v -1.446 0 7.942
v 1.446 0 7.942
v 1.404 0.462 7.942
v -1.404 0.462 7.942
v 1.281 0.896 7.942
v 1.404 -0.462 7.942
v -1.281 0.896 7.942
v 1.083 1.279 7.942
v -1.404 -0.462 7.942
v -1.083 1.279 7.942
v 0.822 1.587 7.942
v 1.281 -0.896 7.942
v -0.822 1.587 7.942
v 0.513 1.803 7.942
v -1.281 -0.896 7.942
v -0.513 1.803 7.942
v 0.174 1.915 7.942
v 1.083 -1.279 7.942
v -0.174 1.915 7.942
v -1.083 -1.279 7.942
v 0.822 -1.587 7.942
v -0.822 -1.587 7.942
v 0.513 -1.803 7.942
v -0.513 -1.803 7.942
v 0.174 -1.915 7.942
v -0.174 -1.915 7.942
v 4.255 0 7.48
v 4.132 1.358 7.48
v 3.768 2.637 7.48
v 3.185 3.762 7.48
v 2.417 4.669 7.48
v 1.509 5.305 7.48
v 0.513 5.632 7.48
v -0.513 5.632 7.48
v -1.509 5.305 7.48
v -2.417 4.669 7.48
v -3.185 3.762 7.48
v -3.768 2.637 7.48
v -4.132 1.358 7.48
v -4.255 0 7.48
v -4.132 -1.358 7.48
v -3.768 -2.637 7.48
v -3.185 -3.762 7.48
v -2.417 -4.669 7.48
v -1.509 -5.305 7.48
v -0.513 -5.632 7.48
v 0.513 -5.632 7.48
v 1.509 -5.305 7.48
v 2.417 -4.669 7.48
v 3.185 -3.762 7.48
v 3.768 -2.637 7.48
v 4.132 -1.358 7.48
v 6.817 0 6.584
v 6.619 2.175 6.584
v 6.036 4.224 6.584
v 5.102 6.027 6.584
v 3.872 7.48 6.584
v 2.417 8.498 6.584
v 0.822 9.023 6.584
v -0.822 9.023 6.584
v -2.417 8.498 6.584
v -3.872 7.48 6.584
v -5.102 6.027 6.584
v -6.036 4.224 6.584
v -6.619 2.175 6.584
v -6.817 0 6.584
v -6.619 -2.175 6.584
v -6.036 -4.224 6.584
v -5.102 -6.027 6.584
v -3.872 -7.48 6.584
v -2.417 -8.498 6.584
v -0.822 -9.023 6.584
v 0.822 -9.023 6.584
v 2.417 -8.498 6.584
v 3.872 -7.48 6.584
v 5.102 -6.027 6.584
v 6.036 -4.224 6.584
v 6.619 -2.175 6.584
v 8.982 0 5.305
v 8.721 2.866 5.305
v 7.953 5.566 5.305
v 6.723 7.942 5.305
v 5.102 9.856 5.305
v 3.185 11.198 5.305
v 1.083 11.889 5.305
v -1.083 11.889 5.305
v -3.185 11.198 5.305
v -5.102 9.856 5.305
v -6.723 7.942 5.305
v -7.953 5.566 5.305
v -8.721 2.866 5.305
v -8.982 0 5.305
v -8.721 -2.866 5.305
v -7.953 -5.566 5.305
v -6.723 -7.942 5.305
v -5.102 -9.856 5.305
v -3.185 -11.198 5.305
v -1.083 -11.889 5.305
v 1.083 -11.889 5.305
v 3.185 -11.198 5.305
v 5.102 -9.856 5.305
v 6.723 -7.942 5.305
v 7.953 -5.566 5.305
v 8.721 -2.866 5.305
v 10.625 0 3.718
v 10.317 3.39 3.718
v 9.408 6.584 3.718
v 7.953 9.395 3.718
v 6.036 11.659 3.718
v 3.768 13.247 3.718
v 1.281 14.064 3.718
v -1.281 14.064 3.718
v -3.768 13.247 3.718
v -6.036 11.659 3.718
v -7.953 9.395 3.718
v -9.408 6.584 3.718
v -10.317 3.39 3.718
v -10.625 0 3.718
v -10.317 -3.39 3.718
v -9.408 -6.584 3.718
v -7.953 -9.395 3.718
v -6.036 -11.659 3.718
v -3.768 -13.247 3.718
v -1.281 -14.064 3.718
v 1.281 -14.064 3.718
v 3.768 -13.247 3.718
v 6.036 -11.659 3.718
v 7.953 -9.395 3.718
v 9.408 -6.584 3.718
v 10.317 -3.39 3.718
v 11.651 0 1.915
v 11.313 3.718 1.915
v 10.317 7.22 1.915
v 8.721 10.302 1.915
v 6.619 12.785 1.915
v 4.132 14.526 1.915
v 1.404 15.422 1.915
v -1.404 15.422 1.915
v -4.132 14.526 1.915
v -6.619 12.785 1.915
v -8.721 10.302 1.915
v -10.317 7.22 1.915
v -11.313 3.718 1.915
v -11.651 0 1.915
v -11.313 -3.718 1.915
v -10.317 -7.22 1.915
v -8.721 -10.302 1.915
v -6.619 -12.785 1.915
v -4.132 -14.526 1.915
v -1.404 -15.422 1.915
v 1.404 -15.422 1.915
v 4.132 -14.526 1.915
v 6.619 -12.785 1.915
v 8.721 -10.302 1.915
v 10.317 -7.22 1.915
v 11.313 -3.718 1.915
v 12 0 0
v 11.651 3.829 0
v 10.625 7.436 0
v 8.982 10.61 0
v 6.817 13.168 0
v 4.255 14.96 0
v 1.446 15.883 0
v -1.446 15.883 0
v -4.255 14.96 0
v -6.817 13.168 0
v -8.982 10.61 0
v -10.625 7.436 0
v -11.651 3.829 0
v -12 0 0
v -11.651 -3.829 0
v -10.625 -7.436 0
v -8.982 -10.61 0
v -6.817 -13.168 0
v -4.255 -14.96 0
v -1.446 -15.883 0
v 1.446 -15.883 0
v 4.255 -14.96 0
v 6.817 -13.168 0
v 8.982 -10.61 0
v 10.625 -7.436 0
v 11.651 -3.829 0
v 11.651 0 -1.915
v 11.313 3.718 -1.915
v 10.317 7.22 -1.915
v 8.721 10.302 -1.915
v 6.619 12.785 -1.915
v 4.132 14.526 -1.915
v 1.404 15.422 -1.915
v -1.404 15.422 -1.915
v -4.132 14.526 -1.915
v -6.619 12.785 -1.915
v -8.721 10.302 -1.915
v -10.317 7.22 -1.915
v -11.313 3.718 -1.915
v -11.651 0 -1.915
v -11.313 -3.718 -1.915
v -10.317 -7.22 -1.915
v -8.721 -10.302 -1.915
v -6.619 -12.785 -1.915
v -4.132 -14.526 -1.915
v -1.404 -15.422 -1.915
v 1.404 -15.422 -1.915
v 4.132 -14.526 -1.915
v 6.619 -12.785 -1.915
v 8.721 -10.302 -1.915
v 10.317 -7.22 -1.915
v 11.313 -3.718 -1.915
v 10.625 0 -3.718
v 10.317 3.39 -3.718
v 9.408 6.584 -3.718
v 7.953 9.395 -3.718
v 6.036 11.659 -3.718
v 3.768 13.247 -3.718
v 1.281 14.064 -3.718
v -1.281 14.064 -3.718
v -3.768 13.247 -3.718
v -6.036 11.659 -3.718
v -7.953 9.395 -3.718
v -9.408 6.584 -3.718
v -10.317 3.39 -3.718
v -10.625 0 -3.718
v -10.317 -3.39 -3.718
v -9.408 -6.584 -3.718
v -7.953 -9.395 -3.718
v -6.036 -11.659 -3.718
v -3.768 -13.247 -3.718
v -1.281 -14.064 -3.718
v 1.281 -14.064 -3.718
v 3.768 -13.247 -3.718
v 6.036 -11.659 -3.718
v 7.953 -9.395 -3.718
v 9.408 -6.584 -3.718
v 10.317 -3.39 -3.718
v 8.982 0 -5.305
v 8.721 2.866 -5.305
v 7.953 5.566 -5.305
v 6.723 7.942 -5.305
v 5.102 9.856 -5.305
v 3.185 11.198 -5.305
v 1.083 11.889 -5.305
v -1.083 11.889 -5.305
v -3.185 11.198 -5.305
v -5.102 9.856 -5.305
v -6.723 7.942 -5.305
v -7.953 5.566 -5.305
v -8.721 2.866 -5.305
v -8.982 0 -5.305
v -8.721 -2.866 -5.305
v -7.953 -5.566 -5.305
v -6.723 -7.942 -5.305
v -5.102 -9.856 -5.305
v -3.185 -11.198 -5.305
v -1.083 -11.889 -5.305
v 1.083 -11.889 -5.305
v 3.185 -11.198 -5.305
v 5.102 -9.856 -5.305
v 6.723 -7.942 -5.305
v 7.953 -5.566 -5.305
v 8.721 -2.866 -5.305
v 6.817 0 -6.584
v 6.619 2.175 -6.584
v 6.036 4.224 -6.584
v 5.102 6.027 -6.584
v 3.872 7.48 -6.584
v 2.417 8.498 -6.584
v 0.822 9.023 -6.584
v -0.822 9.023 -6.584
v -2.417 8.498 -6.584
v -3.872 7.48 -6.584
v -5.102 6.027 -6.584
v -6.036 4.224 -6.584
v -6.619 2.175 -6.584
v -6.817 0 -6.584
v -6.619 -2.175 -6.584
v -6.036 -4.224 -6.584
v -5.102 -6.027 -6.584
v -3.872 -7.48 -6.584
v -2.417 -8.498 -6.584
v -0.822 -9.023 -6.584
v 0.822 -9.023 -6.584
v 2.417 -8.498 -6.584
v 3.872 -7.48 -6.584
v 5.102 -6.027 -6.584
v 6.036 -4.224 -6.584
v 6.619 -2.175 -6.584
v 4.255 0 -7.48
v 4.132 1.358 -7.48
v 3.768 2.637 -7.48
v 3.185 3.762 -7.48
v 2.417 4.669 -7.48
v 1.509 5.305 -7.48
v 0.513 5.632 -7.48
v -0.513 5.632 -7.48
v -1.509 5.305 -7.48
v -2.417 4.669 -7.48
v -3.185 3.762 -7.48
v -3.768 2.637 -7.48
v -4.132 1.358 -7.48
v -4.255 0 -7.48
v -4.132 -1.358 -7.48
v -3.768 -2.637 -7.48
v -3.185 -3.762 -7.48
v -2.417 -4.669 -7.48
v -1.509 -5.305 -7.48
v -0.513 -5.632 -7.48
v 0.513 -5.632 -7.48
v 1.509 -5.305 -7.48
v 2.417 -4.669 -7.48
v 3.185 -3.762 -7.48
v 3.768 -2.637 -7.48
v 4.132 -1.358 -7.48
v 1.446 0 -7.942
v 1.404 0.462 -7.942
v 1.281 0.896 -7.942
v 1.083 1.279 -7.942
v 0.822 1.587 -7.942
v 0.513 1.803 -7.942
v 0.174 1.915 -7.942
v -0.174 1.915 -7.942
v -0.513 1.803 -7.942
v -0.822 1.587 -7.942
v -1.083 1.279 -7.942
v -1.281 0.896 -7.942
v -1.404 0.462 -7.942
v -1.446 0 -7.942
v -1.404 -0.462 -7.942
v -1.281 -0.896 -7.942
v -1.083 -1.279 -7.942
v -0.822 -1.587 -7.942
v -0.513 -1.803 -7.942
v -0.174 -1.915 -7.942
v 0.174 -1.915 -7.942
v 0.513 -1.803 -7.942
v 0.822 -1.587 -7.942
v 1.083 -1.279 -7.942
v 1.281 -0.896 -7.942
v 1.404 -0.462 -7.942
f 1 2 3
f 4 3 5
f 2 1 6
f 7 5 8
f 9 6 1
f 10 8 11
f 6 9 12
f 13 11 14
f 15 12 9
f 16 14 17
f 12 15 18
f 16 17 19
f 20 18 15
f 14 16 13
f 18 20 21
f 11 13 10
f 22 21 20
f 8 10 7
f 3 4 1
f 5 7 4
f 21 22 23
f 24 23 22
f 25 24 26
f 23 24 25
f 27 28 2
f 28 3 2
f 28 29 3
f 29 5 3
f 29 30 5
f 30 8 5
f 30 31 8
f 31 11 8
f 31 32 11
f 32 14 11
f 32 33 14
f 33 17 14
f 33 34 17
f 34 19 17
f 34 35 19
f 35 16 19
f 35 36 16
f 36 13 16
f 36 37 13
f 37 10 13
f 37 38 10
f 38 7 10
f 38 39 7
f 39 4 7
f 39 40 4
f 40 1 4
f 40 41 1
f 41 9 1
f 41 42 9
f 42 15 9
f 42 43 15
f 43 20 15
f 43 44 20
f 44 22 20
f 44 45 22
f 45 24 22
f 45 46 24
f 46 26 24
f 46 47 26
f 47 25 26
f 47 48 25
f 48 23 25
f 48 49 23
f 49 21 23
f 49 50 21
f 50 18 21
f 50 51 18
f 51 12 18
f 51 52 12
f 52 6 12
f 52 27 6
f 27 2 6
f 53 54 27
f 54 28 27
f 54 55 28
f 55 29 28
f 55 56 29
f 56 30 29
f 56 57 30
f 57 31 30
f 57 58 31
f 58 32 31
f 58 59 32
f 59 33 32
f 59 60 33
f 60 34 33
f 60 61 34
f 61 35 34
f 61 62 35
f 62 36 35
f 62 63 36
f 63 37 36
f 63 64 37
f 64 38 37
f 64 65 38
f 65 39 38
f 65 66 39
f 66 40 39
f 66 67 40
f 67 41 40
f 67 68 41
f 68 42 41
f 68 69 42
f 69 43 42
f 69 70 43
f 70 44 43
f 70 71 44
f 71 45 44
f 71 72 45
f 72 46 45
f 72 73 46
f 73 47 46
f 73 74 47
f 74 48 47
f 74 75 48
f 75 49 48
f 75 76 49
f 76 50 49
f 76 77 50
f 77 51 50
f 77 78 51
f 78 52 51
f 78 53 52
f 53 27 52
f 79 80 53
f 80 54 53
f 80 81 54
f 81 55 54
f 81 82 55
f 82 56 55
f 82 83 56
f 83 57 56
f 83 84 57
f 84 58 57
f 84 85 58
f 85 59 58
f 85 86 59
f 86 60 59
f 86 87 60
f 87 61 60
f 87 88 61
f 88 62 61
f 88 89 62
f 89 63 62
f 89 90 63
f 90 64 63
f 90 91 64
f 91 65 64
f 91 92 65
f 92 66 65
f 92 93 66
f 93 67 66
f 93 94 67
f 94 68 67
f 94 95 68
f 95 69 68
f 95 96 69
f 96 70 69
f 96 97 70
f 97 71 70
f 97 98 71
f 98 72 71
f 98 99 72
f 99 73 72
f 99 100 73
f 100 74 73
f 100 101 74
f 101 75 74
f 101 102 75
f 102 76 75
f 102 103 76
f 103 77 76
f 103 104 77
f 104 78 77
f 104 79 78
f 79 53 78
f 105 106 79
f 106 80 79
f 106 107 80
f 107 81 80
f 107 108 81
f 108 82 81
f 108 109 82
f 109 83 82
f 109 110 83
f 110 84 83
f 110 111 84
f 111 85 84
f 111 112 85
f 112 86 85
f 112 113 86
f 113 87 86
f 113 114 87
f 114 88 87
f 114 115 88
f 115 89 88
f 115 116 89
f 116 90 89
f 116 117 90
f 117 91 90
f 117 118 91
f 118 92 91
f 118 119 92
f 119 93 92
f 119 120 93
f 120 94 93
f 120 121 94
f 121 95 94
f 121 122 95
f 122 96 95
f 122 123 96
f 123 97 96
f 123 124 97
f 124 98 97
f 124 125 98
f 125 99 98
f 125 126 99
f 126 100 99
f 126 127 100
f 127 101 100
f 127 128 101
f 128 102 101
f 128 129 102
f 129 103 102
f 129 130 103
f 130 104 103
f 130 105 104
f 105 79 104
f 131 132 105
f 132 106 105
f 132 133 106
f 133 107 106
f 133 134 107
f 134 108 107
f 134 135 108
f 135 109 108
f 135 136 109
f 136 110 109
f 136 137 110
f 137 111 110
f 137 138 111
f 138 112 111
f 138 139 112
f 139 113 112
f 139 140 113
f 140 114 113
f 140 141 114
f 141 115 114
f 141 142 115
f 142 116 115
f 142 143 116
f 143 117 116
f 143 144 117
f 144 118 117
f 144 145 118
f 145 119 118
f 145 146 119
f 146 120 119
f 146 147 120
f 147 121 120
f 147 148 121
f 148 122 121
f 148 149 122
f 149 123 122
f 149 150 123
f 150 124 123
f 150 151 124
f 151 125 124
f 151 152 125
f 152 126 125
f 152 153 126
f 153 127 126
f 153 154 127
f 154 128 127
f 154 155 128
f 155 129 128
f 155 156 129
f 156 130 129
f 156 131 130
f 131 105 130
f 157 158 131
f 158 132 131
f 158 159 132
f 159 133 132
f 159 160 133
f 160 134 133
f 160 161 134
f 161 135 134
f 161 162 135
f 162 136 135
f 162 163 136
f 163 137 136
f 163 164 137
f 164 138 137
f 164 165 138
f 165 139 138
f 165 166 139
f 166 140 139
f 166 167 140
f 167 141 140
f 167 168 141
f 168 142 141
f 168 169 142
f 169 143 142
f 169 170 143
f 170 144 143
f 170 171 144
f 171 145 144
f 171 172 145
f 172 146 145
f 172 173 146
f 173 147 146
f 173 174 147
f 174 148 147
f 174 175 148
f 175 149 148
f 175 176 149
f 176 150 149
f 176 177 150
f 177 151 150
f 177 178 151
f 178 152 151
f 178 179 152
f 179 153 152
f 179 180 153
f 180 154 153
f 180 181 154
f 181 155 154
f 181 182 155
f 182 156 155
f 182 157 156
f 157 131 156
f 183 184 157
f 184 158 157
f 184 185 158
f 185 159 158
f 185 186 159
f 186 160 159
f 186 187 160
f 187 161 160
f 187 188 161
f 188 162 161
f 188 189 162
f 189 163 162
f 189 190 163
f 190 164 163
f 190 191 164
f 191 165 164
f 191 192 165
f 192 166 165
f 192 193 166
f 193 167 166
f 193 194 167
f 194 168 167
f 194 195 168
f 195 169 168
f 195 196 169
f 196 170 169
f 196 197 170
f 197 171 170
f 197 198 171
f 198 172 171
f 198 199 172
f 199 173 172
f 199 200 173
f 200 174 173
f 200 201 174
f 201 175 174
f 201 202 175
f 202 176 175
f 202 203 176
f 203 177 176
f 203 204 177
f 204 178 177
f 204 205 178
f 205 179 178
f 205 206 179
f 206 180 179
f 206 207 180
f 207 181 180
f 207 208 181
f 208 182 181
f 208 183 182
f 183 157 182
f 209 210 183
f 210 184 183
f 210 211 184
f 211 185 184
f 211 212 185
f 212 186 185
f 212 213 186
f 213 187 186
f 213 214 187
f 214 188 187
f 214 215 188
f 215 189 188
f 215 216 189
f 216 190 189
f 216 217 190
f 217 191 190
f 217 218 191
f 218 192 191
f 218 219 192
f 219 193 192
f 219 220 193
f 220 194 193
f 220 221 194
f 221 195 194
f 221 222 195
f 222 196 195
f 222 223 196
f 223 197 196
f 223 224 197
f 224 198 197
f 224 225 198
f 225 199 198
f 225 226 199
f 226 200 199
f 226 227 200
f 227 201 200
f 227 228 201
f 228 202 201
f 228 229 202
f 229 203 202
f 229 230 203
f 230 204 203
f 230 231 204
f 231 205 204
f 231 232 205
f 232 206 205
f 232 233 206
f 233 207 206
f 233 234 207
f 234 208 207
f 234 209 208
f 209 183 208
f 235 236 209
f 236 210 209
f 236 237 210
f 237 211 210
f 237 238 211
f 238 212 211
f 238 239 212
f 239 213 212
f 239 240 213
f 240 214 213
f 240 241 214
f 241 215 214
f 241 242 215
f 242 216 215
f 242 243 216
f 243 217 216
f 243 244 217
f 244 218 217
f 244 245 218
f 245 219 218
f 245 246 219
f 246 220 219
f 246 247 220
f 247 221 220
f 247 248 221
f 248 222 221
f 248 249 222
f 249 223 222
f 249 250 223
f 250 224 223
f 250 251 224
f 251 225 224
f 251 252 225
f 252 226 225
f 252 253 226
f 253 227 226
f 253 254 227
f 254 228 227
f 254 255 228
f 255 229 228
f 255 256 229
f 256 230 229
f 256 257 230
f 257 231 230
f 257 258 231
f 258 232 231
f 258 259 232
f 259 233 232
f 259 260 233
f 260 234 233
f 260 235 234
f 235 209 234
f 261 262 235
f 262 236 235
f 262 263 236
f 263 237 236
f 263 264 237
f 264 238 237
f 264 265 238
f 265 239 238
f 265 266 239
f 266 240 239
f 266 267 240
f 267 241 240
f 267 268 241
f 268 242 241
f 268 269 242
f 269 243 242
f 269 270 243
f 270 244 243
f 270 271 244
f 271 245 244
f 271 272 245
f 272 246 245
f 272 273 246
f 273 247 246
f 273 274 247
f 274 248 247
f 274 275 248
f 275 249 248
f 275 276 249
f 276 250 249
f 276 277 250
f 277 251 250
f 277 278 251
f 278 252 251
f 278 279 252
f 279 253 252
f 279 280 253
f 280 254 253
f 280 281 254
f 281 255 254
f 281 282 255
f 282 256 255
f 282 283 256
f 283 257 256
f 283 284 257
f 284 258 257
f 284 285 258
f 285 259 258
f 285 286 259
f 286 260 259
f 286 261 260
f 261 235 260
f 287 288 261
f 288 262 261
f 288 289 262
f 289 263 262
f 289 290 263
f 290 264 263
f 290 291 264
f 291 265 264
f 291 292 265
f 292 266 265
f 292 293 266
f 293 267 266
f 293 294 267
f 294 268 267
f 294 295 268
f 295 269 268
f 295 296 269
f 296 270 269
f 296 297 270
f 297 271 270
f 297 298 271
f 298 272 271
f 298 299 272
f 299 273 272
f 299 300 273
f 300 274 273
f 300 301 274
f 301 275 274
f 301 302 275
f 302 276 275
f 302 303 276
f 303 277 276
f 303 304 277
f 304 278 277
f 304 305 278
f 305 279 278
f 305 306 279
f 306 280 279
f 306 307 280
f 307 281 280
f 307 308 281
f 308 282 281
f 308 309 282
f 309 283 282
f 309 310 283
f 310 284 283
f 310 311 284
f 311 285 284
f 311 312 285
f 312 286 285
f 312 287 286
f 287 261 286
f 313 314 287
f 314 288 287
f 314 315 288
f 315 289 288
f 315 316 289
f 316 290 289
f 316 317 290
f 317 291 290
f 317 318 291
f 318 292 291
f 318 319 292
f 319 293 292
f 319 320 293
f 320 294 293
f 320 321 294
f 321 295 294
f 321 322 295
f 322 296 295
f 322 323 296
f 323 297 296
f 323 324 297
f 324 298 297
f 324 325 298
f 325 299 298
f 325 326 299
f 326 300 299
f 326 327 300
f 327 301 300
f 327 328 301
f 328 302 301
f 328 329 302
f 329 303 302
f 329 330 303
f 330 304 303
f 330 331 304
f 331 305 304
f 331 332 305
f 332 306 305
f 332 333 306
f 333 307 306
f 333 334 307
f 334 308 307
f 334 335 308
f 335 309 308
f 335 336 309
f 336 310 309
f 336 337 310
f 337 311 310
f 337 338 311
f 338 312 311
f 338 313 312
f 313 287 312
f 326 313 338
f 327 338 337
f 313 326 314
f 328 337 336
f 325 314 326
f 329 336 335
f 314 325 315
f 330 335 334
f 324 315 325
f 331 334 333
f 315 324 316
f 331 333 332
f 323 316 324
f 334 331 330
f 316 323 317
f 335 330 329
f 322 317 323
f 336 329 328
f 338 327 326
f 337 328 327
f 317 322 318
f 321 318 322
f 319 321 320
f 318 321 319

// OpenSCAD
// Generated by generate_scads.py
scale([1.5,2.0,1.0]) {
  sphere(r=8);
}
